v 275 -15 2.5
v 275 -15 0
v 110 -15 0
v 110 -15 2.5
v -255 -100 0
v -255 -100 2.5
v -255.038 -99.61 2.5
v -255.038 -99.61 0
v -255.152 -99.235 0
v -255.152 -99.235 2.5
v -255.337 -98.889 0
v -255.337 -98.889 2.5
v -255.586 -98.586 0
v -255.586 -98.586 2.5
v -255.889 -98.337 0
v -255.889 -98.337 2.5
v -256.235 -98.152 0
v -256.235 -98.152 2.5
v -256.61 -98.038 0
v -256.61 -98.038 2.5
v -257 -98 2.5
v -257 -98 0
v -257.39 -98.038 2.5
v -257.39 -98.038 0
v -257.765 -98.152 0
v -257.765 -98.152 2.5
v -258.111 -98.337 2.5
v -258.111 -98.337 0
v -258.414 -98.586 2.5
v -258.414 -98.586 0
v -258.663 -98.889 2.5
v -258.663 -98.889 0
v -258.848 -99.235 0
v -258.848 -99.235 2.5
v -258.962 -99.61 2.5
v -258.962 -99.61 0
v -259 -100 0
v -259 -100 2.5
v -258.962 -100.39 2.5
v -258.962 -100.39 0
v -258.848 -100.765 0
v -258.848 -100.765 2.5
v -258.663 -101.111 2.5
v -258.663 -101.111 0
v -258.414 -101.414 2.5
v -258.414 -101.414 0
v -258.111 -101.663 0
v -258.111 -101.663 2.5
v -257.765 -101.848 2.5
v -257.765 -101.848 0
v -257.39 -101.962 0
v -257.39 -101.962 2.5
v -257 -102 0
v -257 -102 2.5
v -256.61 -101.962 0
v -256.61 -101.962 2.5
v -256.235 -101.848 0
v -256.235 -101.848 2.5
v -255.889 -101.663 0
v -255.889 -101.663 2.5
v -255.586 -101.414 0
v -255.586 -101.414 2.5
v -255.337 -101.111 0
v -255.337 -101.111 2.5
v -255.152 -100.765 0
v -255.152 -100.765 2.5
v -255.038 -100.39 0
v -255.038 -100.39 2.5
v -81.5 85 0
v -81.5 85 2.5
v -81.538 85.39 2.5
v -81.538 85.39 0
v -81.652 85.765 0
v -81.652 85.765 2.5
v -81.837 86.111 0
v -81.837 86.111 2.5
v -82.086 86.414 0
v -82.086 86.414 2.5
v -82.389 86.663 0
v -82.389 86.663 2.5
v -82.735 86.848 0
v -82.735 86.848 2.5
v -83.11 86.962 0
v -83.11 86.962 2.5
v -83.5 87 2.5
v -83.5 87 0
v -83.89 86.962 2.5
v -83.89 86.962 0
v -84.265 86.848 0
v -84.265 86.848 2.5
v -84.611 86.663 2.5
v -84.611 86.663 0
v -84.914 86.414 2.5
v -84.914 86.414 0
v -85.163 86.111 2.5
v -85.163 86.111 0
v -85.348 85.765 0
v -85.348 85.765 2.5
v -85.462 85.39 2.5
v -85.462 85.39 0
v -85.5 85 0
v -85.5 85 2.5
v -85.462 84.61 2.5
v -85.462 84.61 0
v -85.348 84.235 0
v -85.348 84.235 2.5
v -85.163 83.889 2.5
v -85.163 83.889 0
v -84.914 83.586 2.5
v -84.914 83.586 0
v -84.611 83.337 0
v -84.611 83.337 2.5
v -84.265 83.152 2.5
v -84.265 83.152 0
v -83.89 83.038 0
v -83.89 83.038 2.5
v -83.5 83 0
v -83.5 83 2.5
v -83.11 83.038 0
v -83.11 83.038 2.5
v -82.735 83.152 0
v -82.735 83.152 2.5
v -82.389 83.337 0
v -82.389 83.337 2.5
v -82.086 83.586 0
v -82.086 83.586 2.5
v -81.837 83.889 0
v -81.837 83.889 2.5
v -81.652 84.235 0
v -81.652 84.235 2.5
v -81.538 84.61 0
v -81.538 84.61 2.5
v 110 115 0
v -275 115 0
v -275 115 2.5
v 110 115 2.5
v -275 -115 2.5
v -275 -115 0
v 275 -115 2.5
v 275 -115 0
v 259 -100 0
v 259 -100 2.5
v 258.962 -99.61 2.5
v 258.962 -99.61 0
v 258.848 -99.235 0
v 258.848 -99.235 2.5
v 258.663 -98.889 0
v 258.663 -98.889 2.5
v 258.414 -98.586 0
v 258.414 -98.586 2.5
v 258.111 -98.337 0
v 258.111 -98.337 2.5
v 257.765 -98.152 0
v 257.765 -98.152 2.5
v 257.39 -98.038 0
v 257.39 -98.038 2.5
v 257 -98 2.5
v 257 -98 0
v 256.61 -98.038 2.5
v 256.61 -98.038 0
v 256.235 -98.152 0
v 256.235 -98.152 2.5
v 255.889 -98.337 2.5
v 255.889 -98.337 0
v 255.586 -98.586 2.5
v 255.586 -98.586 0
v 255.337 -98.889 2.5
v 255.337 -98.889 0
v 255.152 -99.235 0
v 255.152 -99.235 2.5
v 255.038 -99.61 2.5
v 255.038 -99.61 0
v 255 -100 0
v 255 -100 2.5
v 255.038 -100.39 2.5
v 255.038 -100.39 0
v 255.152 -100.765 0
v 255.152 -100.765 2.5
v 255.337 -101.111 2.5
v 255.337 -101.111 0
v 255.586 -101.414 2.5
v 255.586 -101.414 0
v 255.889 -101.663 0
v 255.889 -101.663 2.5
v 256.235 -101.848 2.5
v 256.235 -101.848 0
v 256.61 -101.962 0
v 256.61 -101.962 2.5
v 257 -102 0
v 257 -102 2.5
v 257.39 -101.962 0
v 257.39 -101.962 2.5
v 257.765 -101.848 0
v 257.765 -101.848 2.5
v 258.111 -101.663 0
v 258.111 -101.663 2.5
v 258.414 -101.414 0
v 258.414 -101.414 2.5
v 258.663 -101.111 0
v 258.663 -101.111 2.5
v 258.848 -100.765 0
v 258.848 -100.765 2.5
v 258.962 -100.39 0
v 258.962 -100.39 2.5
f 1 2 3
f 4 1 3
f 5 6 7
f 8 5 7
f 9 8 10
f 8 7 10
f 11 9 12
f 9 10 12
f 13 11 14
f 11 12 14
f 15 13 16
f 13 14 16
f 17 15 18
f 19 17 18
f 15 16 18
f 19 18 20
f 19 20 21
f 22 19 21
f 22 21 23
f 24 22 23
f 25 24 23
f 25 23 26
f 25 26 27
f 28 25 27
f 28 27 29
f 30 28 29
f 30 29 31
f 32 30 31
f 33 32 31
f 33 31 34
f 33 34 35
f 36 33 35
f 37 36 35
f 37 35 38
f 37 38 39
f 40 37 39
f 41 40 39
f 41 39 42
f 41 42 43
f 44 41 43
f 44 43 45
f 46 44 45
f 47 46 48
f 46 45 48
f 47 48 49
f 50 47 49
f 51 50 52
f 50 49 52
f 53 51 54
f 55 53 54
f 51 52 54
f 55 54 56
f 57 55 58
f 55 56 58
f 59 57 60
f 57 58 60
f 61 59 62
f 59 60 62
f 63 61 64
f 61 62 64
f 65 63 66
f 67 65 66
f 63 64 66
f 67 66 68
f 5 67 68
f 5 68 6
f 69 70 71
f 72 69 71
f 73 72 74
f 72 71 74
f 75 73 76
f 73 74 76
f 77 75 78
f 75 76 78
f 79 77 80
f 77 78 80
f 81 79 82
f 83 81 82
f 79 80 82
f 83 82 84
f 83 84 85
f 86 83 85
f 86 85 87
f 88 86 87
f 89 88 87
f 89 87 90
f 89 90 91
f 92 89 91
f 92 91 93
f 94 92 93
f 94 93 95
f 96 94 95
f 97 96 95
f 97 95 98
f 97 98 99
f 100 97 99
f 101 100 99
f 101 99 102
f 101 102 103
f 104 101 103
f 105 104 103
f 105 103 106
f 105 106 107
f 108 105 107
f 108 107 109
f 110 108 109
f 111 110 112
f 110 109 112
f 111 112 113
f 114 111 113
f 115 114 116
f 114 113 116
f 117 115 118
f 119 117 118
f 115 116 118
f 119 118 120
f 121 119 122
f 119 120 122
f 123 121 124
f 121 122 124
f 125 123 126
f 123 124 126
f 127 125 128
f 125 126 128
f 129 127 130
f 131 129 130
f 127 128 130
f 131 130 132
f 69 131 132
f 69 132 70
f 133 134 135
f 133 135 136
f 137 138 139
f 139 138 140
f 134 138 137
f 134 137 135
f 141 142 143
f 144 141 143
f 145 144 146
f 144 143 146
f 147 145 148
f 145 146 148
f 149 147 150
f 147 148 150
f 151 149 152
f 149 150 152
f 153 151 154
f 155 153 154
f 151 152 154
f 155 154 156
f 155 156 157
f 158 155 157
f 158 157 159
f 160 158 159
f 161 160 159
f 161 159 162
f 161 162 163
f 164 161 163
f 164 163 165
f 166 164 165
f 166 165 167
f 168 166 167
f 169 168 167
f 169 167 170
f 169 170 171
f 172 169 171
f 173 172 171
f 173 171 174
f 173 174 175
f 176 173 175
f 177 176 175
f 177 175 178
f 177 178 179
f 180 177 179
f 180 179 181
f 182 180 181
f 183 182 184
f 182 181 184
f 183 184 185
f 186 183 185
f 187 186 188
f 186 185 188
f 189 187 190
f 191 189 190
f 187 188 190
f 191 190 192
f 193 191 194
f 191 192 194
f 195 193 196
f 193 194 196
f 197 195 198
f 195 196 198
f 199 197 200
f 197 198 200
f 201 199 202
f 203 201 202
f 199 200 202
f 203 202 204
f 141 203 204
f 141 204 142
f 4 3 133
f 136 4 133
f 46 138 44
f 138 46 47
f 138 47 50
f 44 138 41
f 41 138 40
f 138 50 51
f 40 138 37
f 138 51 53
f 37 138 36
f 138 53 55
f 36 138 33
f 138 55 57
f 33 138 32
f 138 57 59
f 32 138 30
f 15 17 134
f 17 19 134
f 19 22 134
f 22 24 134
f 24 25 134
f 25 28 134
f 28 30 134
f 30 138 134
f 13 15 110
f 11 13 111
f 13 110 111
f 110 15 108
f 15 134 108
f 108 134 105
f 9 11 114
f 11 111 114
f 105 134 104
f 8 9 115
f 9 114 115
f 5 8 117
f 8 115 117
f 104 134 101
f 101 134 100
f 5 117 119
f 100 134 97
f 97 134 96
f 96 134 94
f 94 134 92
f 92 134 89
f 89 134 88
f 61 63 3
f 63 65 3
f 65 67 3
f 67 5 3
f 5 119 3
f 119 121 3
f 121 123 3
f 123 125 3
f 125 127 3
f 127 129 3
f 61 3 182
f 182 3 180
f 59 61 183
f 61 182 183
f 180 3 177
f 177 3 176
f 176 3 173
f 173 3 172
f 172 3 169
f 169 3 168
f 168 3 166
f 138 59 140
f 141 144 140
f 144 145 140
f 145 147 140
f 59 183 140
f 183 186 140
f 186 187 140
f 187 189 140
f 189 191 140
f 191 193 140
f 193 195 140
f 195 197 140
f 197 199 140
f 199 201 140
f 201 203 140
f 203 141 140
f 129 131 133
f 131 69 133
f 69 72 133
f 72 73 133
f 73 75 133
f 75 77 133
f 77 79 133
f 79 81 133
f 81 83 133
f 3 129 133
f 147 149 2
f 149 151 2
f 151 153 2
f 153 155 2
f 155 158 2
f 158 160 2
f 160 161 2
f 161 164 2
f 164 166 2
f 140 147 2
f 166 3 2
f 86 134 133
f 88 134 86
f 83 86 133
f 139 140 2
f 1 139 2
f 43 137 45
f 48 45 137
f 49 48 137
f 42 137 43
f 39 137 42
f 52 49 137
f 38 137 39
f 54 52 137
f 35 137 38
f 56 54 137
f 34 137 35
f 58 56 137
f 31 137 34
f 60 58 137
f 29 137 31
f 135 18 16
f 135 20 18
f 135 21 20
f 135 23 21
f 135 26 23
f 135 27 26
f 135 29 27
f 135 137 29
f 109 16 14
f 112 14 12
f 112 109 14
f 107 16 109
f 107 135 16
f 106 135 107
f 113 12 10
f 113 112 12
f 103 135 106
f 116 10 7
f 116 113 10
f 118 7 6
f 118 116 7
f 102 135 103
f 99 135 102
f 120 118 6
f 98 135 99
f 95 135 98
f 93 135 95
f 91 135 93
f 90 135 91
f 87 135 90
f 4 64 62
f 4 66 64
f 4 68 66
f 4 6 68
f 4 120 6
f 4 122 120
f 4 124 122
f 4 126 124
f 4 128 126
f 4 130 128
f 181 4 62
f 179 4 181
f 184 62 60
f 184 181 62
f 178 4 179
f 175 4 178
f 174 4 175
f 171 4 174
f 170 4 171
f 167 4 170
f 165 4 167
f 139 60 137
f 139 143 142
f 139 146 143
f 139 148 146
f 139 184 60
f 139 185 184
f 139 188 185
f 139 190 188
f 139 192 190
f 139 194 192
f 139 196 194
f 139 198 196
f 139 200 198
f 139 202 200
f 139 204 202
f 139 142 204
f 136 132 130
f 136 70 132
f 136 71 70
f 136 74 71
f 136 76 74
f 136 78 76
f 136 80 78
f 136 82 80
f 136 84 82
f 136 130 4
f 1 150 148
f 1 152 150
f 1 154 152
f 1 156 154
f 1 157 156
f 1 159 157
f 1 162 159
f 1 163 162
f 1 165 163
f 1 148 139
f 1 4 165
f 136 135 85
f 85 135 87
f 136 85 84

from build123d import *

# Parameters (mm, degrees)
SCHIZZO1_W                   = 550
SCHIZZO1_H                   = 230
ESTRUSIONE_ESTRUSIONE1_DEPTH = 2.5
SCHIZZO2_W                   = 165
SCHIZZO2_H                   = 130
TAGLIO_ESTRUSIONE1_DEPTH     = 10
SCHIZZO3_R                   = 2
TAGLIO_ESTRUSIONE2_DEPTH     = 10


with BuildPart() as part:
    # Schizzo1 → Estrusione-Estrusione1 (new body)
    with BuildSketch(Plane.XY):
        Rectangle(SCHIZZO1_W, SCHIZZO1_H)
    extrude(amount=ESTRUSIONE_ESTRUSIONE1_DEPTH)

    # Schizzo2 → Taglio-Estrusione1 (cut)
    with BuildSketch(Plane(origin=(0, 0, 0), x_dir=(-1, 0, 0), z_dir=(0, 0, -1))):
        with Locations((-192.5, 50)):
            Rectangle(SCHIZZO2_W, SCHIZZO2_H)
    extrude(amount=-TAGLIO_ESTRUSIONE1_DEPTH, mode=Mode.SUBTRACT)

    # Schizzo3 → Taglio-Estrusione2 (cut)
    with BuildSketch(Plane.XY.offset(2.5)):
        with Locations((-83.5, 85)):
            Circle(SCHIZZO3_R)
        with Locations((-257, -100)):
            Circle(SCHIZZO3_R)
        with Locations((257, -100)):
            Circle(SCHIZZO3_R)
    extrude(amount=-TAGLIO_ESTRUSIONE2_DEPTH, mode=Mode.SUBTRACT)


solid = part.part
